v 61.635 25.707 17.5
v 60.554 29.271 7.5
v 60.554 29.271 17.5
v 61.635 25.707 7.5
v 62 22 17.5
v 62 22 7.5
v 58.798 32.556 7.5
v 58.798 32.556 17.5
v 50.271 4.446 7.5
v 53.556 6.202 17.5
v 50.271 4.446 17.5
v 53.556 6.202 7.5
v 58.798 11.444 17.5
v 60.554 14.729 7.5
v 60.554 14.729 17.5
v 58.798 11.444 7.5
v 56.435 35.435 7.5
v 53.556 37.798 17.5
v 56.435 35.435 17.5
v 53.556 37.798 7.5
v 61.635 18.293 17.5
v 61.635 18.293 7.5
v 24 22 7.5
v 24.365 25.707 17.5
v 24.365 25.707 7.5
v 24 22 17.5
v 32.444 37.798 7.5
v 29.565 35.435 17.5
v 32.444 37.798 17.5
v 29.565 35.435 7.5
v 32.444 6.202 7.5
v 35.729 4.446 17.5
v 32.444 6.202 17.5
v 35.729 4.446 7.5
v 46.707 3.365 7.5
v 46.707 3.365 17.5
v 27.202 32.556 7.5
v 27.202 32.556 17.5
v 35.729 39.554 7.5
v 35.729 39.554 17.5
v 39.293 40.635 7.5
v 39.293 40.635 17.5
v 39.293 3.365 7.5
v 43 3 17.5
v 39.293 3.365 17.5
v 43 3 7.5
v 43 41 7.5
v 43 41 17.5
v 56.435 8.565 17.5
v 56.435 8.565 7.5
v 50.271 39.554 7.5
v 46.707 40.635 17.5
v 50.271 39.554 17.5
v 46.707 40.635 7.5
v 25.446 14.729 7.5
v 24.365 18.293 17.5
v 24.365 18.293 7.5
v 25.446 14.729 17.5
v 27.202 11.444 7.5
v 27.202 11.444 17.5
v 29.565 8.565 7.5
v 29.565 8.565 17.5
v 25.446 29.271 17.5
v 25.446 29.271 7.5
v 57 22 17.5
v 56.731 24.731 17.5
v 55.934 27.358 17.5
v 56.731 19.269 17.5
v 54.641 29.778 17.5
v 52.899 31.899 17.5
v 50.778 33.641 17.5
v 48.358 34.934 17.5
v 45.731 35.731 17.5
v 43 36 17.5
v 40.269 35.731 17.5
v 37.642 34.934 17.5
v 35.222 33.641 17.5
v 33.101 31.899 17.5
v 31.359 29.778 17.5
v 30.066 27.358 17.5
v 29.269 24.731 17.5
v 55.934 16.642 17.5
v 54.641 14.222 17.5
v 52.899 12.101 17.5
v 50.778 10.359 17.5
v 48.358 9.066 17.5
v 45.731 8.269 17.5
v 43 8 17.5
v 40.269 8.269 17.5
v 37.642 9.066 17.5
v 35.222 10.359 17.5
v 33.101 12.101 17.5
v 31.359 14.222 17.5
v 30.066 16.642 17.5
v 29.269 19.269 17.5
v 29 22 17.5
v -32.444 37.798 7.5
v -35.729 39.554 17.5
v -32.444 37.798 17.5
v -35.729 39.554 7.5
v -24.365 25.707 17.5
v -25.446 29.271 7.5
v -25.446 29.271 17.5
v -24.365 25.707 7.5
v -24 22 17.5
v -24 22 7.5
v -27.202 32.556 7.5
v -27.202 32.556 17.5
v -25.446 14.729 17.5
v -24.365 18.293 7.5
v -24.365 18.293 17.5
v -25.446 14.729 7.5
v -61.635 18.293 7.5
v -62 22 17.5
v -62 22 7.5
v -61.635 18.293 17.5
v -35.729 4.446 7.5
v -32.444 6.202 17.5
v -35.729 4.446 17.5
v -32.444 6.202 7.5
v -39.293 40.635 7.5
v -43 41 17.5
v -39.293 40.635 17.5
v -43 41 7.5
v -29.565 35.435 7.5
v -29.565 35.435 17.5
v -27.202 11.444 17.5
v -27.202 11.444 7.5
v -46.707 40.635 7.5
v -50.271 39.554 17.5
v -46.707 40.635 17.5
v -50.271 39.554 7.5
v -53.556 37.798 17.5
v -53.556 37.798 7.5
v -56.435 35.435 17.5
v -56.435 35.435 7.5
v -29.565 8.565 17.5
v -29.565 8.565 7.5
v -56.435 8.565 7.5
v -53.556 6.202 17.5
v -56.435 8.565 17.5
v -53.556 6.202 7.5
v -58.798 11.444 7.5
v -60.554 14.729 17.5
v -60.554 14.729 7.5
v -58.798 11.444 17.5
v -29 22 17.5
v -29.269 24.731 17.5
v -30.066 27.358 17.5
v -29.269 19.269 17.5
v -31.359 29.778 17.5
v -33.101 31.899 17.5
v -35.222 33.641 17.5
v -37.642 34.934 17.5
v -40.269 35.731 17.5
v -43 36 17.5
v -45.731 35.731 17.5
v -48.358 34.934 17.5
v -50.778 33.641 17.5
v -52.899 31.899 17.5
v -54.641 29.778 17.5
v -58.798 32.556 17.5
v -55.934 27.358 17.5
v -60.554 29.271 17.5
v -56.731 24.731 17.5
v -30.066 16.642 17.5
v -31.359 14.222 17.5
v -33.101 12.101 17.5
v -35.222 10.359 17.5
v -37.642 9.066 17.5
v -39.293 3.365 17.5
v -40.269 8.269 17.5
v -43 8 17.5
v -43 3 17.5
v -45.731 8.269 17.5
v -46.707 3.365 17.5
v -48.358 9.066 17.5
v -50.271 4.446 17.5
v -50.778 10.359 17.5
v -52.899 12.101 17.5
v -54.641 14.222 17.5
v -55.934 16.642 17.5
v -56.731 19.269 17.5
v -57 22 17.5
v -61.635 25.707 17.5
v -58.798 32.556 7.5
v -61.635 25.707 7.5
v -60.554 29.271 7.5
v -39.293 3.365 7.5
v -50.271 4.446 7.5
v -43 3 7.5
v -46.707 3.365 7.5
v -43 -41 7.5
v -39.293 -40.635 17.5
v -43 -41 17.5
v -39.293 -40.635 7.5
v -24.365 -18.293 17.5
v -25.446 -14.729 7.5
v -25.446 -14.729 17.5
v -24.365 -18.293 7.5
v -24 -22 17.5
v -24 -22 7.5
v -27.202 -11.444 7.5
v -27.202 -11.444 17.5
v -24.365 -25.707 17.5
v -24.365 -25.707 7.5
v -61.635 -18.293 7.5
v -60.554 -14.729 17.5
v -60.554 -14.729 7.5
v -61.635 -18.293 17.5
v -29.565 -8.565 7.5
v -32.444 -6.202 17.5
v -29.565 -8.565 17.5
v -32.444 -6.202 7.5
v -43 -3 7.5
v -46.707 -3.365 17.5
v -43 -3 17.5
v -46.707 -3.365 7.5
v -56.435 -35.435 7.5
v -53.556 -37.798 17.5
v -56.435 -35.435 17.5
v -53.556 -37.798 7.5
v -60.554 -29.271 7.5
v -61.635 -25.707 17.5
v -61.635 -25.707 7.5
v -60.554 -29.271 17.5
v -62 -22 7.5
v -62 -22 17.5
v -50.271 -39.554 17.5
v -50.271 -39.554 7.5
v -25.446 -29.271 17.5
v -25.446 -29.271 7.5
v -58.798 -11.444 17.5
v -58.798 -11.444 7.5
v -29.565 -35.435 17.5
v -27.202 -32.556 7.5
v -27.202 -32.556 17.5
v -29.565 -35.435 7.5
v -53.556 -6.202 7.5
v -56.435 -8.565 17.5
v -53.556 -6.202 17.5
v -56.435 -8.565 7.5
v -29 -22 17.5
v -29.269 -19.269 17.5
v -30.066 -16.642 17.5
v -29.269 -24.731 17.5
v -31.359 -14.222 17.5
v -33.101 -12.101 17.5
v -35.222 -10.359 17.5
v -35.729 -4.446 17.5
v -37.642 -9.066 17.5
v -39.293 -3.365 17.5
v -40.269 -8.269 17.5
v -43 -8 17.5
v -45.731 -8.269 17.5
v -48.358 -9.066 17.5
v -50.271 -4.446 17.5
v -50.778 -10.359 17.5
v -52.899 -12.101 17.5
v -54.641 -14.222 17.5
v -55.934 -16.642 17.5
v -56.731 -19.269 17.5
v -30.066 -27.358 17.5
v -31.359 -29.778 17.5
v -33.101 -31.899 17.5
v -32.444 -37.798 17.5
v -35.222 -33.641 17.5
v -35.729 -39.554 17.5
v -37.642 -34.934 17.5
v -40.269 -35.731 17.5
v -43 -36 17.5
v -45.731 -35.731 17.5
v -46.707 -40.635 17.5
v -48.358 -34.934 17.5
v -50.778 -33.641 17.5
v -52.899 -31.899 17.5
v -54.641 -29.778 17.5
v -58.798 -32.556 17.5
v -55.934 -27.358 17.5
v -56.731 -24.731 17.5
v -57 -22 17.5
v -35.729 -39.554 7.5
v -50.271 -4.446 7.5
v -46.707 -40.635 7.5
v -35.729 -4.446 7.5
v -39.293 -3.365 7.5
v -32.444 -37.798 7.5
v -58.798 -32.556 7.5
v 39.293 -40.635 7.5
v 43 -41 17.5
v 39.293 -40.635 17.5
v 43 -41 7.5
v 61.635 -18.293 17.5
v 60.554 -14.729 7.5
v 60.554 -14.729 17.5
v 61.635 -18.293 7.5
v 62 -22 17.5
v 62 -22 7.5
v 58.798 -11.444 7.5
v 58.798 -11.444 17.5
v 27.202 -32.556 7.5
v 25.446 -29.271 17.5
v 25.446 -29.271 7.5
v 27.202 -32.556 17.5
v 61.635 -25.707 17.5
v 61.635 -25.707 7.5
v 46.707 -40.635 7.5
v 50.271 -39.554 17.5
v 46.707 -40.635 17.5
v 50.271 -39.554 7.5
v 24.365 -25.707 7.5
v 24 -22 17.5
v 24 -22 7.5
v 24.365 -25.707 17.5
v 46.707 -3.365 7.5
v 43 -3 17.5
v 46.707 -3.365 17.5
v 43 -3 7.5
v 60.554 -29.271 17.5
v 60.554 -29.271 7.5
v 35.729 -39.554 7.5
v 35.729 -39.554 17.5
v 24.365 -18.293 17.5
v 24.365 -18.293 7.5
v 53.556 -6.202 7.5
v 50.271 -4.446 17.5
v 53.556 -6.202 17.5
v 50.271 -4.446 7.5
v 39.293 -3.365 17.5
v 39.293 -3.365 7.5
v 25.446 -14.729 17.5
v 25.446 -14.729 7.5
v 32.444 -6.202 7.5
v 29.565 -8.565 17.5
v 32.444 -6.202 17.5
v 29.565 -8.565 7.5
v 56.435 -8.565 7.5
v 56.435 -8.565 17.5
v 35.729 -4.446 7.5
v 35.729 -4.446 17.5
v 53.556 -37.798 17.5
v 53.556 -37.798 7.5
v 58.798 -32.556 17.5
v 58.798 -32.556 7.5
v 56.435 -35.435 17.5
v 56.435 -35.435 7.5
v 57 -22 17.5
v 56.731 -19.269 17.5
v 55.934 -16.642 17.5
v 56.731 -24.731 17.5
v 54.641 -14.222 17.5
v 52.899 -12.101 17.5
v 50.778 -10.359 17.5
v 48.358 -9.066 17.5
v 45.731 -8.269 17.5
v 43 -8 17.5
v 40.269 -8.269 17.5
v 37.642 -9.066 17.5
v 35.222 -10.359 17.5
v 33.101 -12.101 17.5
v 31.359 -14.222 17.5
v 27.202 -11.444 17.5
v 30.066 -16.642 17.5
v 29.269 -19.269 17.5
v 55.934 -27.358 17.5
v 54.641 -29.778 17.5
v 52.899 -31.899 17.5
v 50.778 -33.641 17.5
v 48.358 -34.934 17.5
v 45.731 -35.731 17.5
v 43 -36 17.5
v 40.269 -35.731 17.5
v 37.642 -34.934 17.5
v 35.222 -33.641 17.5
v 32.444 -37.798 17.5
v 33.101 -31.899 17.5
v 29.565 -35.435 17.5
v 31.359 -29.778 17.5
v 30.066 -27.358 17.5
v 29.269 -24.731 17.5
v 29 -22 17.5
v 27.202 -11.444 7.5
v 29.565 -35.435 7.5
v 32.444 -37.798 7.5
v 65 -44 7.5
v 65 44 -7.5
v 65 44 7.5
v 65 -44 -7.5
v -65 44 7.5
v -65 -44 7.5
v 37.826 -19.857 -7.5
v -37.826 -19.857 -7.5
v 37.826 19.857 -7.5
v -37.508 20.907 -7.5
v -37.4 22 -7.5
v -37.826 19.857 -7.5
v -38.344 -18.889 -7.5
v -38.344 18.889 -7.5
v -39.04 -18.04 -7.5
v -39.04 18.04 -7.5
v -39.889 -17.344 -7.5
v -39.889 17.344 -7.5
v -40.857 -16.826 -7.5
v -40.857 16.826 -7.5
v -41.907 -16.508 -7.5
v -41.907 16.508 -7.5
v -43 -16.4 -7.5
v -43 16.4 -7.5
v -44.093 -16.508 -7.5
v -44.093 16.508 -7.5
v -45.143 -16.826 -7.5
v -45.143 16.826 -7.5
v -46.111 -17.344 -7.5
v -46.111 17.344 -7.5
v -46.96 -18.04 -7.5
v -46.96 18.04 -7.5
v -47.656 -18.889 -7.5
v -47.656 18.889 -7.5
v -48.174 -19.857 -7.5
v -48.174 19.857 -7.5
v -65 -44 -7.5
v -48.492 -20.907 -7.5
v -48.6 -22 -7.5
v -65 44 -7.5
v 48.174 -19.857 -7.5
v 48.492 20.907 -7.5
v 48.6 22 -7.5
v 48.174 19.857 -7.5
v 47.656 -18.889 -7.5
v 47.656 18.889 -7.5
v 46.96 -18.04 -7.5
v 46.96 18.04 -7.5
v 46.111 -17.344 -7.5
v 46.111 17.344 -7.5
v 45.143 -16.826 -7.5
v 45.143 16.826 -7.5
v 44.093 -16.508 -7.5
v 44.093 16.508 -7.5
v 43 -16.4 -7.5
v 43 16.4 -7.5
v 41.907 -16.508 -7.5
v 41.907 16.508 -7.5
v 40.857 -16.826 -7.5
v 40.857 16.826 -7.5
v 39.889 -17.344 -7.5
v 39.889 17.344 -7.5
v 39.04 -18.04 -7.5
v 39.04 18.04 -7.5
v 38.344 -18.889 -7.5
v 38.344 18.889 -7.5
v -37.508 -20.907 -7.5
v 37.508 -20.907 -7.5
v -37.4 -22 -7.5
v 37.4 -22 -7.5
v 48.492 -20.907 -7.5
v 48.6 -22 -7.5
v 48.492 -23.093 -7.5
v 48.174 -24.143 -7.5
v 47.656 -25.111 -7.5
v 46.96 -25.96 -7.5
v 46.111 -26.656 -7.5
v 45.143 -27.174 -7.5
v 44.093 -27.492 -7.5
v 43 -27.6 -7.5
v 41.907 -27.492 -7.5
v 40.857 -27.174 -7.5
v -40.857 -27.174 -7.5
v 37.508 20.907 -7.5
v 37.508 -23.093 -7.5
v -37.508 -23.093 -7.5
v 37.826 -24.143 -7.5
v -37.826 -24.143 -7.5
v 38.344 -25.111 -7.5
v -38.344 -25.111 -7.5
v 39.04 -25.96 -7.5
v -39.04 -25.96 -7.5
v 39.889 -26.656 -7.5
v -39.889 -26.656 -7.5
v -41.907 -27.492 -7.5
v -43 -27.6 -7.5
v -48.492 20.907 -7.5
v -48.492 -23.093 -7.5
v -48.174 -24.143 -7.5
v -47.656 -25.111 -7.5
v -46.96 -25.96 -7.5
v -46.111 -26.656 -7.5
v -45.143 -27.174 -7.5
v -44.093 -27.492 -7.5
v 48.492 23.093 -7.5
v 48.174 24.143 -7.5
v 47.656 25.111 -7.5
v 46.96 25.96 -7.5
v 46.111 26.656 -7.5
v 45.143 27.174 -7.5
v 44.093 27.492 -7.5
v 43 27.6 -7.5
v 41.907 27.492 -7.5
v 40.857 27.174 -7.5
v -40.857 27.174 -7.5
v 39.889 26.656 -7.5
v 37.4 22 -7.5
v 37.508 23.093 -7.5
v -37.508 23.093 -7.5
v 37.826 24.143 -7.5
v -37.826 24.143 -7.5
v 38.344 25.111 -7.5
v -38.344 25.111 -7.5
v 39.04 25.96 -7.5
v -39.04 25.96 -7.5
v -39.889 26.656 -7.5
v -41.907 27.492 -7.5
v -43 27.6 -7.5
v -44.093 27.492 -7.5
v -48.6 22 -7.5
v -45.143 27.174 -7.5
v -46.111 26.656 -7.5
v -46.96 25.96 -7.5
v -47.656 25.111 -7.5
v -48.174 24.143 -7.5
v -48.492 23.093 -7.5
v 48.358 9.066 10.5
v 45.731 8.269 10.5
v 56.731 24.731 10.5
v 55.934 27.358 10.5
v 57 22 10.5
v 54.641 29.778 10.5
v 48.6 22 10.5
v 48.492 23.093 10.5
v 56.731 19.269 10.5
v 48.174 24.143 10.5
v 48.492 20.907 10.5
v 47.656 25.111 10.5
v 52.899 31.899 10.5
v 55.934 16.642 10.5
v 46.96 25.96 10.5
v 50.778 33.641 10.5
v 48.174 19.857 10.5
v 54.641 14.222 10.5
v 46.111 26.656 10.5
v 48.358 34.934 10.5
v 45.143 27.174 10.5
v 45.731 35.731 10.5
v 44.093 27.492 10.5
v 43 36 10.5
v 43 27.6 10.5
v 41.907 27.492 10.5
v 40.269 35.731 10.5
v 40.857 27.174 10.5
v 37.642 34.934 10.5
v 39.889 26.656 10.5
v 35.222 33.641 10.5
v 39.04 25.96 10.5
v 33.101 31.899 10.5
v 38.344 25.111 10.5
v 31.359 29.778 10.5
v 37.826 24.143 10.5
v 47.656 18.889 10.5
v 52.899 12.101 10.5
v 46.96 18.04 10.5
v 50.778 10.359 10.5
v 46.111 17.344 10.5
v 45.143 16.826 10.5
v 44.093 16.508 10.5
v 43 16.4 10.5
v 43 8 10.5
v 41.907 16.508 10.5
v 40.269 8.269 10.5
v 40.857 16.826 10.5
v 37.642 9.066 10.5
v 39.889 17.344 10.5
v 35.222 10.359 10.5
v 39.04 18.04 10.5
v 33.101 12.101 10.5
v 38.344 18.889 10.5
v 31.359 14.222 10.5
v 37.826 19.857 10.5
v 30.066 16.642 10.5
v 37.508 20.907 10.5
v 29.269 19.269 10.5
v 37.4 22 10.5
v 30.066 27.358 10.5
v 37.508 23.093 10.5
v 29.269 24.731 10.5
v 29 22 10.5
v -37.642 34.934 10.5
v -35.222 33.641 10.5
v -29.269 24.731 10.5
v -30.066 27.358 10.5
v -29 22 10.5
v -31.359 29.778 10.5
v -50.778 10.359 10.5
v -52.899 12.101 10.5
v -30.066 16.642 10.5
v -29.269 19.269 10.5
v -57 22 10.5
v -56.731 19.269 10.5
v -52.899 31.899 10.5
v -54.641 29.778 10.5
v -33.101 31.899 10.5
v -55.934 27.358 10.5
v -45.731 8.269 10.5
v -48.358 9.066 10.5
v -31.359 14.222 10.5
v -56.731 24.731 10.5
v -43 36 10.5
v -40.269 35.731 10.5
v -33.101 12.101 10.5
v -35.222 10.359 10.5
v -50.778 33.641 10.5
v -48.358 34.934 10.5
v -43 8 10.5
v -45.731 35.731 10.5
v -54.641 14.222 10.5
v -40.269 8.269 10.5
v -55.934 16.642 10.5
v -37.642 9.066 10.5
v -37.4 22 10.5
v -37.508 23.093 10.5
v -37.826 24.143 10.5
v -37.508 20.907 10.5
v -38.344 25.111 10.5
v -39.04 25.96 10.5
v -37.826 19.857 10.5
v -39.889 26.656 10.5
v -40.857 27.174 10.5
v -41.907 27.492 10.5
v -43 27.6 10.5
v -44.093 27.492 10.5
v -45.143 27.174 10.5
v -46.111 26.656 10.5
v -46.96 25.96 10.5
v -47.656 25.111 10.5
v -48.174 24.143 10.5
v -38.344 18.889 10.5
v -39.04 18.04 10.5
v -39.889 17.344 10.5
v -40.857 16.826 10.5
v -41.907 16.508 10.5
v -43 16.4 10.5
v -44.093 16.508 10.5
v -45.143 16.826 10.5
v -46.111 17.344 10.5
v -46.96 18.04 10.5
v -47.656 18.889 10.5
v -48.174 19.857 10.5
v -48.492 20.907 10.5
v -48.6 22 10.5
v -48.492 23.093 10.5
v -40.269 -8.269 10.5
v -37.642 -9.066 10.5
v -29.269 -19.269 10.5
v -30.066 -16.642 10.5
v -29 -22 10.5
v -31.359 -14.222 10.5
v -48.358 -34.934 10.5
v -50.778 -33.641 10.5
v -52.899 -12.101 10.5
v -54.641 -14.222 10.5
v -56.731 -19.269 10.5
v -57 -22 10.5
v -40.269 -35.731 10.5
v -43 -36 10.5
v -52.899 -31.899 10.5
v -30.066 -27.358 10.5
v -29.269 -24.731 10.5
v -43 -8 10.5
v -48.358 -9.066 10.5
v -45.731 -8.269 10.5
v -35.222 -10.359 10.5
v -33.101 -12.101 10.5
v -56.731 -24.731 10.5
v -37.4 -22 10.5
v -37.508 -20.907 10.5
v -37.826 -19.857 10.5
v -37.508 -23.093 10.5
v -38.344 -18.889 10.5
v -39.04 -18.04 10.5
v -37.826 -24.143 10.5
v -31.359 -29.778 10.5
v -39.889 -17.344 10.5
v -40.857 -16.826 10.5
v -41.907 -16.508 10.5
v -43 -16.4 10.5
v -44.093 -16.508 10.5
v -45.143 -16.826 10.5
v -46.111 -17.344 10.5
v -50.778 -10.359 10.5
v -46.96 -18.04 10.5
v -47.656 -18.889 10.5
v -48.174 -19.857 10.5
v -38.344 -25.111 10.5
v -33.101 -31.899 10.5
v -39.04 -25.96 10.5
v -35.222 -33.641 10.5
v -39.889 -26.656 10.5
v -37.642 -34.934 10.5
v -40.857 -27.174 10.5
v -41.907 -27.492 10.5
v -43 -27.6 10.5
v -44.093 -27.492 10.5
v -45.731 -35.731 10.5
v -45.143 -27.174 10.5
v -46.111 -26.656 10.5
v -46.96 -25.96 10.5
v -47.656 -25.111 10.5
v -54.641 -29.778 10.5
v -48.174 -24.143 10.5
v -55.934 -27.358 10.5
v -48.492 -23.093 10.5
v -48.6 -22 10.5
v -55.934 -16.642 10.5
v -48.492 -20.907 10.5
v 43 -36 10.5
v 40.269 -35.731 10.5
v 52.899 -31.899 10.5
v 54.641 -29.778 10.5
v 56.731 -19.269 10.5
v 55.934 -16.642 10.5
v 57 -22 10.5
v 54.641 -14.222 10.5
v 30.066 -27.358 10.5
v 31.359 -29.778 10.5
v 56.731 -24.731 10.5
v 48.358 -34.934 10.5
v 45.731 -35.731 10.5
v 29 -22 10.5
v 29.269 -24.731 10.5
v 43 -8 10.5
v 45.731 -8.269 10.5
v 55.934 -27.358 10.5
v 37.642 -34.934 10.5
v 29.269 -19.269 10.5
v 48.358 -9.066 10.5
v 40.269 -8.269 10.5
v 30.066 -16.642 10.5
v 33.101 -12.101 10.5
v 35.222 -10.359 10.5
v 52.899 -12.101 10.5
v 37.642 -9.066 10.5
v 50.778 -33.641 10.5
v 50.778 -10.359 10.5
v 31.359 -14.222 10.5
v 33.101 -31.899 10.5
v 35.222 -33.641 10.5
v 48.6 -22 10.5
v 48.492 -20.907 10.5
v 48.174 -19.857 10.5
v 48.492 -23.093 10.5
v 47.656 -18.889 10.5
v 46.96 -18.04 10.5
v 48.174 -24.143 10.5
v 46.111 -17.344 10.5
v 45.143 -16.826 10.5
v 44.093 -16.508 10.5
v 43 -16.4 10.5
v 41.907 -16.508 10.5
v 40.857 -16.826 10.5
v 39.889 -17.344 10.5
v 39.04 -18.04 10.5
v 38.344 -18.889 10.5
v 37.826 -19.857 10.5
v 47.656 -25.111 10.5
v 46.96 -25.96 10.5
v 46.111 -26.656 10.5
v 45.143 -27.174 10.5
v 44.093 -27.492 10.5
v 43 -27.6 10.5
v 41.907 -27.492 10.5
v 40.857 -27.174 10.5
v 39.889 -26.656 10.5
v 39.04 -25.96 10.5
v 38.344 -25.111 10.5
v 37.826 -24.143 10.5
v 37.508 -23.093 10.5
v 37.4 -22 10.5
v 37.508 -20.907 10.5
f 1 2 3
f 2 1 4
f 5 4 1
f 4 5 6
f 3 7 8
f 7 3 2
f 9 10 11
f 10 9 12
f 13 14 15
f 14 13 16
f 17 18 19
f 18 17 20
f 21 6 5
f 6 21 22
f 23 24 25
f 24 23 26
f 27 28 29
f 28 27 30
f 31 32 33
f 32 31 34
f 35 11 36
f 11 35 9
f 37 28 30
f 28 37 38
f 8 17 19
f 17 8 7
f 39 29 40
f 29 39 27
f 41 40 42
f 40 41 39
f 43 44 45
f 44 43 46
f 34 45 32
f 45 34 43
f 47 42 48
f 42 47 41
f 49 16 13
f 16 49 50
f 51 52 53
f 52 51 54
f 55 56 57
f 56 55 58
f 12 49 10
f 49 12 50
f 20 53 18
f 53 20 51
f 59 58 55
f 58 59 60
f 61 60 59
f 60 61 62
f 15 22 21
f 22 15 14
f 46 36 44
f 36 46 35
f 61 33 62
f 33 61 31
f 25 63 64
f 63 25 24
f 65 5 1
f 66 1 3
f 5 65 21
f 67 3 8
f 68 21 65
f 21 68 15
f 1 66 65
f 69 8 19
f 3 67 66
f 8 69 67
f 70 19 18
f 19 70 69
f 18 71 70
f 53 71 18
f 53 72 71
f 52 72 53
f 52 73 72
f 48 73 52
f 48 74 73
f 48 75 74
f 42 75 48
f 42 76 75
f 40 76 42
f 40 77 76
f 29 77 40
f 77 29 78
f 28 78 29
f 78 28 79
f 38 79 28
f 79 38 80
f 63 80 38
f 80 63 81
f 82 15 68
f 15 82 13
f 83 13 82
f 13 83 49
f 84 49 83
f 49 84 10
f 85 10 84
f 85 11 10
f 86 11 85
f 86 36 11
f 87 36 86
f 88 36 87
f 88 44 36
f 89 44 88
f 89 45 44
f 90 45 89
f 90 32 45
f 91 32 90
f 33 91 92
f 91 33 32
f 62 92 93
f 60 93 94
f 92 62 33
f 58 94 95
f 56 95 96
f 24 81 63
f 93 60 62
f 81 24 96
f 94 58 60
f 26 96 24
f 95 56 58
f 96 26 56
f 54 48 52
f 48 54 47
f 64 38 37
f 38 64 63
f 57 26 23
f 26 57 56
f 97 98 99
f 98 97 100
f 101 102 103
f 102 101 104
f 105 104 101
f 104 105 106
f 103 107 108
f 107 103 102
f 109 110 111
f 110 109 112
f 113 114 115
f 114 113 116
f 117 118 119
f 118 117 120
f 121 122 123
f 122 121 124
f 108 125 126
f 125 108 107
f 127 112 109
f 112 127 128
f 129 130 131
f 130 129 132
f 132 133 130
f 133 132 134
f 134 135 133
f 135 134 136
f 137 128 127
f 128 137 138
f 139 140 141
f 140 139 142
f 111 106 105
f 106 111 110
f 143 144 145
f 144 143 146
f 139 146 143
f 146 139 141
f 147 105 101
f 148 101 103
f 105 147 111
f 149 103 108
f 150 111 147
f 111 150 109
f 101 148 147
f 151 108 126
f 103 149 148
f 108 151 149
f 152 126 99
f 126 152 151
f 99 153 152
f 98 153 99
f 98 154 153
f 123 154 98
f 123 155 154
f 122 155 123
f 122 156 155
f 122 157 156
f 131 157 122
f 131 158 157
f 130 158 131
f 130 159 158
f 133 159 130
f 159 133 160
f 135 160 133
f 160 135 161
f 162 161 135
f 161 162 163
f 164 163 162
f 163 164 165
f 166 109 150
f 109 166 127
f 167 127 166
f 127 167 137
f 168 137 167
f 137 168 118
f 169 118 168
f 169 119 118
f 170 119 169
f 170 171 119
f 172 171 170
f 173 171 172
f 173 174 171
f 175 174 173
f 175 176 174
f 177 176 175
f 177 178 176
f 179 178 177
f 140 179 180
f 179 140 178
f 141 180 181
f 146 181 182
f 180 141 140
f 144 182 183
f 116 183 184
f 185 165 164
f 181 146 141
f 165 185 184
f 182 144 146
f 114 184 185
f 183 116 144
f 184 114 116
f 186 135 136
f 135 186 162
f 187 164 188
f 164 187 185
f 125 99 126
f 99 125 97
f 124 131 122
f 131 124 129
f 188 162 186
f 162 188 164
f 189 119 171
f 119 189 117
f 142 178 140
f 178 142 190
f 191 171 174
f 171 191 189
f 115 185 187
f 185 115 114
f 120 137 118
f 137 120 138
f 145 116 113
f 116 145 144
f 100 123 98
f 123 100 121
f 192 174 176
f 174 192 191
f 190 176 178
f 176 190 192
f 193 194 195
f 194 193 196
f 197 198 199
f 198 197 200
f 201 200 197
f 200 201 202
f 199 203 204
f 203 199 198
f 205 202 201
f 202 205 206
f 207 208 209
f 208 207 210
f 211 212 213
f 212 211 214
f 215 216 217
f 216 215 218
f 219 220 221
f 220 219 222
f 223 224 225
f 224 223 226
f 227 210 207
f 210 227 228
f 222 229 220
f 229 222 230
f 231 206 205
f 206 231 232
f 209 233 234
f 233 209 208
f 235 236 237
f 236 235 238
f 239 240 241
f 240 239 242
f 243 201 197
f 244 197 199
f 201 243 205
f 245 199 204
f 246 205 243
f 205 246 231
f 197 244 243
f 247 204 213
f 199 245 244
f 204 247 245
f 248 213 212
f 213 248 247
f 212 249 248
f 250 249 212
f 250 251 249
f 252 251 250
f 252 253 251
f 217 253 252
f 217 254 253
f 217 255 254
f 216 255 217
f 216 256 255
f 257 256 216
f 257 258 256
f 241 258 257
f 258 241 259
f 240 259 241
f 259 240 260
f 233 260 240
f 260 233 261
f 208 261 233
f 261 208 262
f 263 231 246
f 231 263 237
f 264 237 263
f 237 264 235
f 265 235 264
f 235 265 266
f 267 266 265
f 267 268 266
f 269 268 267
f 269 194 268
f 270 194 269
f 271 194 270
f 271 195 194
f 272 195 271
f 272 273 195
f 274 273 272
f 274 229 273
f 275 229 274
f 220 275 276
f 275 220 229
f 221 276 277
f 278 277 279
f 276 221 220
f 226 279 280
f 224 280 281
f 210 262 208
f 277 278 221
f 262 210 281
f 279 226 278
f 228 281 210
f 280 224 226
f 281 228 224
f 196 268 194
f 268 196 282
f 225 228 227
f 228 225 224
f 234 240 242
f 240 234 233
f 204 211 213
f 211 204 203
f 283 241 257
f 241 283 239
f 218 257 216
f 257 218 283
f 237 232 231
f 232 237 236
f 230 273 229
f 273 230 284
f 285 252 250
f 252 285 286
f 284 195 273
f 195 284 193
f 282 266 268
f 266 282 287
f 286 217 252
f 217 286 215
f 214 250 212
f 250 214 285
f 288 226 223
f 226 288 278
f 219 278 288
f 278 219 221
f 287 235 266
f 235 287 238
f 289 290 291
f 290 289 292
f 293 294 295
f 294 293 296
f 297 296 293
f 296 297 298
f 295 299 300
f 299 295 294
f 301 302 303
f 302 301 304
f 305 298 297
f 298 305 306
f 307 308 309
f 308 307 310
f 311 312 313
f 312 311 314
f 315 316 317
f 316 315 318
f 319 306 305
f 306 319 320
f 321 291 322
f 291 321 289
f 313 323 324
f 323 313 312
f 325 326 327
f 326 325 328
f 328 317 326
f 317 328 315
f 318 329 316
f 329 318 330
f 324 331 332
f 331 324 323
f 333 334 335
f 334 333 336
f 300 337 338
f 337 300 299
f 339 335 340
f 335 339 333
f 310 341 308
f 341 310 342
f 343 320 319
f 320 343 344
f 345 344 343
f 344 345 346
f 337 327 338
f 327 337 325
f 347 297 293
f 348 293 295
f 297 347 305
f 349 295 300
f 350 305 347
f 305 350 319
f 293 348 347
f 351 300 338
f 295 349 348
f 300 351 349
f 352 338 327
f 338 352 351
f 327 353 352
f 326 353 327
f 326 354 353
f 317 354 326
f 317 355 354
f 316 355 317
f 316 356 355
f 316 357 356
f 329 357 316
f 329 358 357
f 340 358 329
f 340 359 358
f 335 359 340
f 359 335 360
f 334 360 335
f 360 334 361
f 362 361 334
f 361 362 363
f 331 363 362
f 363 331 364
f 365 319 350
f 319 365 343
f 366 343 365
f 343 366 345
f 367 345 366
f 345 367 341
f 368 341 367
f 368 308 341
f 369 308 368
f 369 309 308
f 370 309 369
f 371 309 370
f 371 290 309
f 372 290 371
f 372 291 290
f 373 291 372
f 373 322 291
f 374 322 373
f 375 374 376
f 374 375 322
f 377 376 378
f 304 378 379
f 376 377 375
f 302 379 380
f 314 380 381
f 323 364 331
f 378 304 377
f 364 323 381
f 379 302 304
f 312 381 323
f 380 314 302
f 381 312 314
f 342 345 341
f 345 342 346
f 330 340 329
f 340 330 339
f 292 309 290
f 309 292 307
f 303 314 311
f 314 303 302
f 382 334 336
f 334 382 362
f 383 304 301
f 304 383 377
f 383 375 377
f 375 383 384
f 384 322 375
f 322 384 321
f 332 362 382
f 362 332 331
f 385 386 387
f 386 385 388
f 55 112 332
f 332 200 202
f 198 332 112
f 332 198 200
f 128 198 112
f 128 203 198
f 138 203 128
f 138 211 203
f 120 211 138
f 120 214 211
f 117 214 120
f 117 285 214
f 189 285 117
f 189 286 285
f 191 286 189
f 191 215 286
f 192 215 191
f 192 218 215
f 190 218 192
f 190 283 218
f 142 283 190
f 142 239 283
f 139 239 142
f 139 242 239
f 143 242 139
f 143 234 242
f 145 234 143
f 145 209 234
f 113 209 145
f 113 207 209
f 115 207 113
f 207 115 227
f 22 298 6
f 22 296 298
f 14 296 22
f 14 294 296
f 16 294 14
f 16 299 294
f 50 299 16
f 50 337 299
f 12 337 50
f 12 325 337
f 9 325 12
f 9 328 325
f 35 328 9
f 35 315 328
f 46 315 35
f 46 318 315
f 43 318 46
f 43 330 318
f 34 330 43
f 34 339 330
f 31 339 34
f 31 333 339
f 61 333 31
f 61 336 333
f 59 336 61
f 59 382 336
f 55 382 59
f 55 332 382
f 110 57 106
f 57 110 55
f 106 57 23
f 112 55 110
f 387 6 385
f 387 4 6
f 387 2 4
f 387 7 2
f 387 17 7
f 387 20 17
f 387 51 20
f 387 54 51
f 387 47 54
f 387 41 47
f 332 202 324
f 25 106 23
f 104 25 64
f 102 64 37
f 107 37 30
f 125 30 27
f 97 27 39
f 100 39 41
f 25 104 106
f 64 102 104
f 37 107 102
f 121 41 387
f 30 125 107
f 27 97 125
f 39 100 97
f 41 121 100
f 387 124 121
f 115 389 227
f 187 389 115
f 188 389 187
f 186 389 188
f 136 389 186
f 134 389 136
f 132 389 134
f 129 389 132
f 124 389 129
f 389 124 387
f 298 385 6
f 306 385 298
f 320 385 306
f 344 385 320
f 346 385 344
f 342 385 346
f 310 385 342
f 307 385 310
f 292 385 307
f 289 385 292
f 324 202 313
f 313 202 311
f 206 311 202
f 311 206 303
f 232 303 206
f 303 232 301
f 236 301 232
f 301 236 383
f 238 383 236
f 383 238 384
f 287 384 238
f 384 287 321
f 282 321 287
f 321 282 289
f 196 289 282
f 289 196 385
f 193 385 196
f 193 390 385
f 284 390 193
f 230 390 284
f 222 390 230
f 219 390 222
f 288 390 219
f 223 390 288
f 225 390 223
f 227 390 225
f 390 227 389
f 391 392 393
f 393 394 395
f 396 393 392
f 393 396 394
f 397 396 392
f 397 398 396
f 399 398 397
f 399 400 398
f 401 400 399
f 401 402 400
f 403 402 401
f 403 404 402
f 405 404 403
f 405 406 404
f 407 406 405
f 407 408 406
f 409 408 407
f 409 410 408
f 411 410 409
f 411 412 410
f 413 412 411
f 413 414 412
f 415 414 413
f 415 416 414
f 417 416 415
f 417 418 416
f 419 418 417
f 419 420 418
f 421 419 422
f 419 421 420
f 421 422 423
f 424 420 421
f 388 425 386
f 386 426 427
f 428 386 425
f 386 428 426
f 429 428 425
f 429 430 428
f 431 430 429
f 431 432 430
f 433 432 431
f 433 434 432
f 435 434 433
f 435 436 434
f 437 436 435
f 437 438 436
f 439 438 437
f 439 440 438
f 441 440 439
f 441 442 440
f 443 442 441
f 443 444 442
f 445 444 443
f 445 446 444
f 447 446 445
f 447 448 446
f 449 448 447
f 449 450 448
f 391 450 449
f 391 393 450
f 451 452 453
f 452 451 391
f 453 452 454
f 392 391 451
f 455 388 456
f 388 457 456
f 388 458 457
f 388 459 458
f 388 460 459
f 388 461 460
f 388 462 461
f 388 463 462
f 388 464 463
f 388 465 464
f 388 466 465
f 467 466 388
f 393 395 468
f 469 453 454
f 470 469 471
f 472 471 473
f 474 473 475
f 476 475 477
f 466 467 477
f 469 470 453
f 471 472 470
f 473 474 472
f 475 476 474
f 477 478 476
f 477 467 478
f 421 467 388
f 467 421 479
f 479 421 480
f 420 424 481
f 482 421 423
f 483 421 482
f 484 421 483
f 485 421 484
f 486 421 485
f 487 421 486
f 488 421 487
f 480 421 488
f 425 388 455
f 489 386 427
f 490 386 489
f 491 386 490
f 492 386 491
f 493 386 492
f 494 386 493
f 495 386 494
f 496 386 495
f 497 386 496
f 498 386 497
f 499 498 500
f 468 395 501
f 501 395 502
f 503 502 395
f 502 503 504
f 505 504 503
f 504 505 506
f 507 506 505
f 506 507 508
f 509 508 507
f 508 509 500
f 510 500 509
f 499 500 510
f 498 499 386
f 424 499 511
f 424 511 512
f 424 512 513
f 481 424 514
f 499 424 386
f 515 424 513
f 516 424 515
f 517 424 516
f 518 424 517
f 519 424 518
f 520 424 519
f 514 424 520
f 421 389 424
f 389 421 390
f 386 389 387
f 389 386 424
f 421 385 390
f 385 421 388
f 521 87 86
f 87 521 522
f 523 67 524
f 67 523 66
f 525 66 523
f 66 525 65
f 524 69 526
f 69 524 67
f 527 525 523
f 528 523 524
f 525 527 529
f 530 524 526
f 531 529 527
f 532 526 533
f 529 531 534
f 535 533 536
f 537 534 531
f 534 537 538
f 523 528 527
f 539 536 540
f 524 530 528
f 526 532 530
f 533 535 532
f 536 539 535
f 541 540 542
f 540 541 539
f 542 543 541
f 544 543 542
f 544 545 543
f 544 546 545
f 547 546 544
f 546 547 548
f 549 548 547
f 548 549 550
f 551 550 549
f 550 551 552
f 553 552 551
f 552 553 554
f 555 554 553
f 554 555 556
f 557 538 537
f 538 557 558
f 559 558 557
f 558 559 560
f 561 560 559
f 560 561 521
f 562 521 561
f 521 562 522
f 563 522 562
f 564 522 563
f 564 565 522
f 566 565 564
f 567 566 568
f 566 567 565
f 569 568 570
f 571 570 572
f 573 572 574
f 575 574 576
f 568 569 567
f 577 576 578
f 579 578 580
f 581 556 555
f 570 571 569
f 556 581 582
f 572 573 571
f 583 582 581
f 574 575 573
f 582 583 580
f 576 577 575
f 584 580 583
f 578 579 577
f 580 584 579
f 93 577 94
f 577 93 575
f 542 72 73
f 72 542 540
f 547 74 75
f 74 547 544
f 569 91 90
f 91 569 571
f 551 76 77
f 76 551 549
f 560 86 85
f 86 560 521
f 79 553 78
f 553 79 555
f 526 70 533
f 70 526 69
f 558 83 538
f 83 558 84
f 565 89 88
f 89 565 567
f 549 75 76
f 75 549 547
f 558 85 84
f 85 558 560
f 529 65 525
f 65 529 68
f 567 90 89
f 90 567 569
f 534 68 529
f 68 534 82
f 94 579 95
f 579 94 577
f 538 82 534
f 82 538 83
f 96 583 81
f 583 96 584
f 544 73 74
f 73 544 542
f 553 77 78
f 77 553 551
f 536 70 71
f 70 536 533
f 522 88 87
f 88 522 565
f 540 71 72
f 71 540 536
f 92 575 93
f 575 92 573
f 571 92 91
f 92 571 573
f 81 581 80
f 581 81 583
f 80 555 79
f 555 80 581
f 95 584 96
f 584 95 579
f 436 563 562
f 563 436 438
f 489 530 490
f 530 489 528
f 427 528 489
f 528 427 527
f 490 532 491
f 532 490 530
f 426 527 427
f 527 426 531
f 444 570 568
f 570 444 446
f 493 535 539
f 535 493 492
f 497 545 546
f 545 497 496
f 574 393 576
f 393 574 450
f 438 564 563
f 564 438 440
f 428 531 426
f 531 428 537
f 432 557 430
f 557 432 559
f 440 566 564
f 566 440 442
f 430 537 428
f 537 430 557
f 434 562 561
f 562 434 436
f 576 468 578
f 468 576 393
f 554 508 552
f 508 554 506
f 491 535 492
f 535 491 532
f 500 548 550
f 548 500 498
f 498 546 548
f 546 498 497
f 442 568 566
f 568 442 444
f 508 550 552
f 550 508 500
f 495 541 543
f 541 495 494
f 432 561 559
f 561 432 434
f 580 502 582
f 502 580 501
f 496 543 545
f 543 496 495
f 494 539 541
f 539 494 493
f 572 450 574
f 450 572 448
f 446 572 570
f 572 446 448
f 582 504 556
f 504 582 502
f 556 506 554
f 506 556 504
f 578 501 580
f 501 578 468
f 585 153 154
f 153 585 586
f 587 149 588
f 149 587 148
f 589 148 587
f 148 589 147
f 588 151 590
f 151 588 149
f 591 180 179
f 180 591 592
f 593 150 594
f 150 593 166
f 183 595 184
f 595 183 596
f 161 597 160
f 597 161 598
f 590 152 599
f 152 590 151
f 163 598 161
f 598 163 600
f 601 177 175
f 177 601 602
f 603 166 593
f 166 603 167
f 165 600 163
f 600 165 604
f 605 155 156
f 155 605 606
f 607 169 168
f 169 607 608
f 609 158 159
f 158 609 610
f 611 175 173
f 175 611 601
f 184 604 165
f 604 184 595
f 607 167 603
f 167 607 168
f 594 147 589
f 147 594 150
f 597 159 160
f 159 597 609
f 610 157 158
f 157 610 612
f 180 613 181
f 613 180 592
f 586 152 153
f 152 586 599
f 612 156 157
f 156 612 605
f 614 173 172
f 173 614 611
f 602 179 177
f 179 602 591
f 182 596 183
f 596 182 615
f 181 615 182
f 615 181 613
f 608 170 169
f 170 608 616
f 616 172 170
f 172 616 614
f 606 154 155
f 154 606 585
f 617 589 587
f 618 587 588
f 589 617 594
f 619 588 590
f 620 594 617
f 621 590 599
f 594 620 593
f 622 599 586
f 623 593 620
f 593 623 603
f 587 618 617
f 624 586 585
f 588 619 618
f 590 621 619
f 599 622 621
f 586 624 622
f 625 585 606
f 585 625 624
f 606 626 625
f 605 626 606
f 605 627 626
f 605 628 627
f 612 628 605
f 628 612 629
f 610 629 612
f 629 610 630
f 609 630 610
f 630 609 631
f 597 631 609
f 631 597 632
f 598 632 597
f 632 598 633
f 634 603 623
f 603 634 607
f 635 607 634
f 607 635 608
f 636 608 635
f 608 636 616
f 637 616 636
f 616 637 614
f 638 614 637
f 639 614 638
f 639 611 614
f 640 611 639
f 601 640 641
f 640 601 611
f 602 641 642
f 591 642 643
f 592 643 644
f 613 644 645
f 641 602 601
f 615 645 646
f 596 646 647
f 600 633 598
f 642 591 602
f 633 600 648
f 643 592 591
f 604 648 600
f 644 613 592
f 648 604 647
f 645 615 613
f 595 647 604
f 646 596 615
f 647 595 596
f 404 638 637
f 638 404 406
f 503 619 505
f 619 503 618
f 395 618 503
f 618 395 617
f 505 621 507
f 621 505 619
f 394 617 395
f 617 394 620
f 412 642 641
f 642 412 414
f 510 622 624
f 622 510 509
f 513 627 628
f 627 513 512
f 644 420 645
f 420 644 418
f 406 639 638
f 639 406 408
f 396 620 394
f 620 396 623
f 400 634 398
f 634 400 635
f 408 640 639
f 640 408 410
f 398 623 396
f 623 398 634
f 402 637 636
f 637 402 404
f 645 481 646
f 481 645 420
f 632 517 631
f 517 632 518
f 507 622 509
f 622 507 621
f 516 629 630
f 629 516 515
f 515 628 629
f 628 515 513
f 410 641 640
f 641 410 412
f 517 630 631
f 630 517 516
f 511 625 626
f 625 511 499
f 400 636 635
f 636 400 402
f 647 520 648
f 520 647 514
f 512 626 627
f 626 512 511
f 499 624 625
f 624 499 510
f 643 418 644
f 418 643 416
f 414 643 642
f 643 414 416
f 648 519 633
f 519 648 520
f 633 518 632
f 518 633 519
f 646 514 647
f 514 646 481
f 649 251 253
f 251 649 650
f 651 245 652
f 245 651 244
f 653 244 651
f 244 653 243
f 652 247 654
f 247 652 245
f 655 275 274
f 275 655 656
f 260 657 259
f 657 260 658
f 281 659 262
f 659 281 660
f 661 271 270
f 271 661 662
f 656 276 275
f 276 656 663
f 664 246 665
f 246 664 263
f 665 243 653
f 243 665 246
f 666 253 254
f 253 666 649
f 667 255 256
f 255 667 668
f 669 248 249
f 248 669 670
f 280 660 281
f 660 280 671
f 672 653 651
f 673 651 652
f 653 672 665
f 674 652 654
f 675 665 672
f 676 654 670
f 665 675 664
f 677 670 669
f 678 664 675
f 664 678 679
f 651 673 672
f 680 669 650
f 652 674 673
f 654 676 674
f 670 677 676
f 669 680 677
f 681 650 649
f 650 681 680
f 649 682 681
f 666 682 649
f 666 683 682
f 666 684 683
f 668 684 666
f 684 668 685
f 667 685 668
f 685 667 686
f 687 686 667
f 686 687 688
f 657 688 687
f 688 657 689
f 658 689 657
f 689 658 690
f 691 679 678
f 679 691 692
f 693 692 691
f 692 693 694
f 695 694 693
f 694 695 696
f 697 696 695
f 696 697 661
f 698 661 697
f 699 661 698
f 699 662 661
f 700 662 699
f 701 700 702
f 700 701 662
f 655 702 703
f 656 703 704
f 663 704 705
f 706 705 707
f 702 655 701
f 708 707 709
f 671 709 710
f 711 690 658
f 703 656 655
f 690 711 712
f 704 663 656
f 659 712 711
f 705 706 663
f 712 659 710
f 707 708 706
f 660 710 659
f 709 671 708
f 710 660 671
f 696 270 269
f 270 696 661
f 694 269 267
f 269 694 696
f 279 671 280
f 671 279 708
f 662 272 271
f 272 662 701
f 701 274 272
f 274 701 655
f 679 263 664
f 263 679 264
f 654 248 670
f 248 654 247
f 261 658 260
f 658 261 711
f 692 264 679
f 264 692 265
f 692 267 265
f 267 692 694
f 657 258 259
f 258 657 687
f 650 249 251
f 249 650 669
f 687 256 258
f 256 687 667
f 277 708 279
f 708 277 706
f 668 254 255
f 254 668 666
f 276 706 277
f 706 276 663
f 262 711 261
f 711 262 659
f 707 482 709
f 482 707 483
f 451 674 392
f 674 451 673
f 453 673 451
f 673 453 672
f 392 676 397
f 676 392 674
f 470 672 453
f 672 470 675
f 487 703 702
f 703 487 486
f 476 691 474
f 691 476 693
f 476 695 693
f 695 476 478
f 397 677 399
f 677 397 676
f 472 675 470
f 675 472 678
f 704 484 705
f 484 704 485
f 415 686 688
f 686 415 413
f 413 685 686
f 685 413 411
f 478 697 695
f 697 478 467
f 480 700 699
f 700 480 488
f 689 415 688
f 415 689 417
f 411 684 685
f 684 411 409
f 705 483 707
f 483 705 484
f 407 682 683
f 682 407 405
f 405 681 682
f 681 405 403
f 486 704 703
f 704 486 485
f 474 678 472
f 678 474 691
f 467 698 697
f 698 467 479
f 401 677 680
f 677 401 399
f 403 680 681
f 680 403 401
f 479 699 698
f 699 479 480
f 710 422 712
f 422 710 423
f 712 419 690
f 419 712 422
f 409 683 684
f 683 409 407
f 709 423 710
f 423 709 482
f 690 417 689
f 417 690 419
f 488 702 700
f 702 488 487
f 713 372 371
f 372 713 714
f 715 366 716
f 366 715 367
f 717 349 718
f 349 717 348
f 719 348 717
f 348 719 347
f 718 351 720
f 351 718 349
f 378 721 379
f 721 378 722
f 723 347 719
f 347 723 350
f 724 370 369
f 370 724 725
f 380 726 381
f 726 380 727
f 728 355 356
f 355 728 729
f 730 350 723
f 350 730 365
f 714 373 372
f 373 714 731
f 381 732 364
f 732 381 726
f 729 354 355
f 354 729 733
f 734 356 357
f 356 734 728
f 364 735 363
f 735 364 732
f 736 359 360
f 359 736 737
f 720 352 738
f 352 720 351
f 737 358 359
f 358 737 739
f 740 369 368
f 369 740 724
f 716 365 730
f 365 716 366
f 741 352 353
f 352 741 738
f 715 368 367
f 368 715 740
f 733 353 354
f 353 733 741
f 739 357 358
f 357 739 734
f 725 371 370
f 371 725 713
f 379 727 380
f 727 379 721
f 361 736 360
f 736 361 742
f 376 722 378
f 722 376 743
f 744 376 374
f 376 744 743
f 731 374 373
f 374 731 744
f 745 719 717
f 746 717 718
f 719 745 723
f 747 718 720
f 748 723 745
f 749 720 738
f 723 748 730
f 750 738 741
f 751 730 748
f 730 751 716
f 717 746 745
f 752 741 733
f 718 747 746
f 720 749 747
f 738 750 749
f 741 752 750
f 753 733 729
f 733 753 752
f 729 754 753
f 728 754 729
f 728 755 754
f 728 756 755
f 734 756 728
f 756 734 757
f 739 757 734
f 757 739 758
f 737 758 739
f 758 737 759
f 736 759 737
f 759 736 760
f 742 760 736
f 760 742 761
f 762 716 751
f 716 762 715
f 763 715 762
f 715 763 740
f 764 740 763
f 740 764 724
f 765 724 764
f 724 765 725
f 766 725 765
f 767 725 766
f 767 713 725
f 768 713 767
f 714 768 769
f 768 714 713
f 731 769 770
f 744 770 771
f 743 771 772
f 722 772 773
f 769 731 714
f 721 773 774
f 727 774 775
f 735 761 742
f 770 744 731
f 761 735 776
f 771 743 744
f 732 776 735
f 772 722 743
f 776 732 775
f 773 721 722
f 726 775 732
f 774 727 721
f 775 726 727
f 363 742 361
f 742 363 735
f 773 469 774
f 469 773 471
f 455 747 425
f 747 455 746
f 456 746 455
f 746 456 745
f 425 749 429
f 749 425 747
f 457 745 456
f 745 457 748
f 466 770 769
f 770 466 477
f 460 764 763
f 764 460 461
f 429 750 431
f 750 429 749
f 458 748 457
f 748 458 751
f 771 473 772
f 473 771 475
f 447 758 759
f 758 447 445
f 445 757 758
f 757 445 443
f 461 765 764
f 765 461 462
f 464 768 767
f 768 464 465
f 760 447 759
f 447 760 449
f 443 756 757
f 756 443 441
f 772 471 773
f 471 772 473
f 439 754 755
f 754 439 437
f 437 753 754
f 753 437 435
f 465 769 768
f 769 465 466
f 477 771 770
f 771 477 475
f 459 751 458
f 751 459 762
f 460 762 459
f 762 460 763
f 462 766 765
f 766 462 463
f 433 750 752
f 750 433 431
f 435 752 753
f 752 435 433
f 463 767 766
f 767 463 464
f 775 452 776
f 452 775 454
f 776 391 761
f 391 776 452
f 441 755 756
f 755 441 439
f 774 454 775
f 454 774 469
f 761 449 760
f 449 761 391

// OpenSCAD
$fn = 32;

// ----------------------------------------------------------------------
// Socket pad plate
// bosses with counterbored sockets for the screws
// ----------------------------------------------------------------------

// --- parameters (mm) ---
base_t = 15;            // base plate thickness
boss_h = 10;            // boss height above the base plate
boss_d = 38;            // boss diameter
socket_d = 28;          // socket diameter
socket_depth = 7;       // socket depth from the boss face
bolt_d = 11.2;          // screw clearance hole through the socket floor
plate = [130, 88, 15];  // overall size (x, y, z)
edge = 22;              // boss centre offset from the plate edge
pads = 4;               // boss count, one per corner

// --- derived feature positions (mm) ---
height = base_t + boss_h;        // = 25   overall height of the part
corner_x = plate[0] / 2 - edge;  // = 43   boss centre X
corner_y = plate[1] / 2 - edge;  // = 22   boss centre Y
feature_centers = [
  [corner_x, corner_y],
  [-corner_x, corner_y],
  [-corner_x, -corner_y],
  [corner_x, -corner_y]
];   // boss centres: sockets, holes and the pads themselves are placed from here

// base plate, bosses on feature_centers, socket + through hole in each
difference() {
  union() {
    cube(plate, center = true);
    for (centre = feature_centers)
      translate([centre[0], centre[1], plate[2] / 2 - 1])
        cylinder(d = boss_d, h = boss_h + 1);
  }
  for (centre = feature_centers) {
    translate([centre[0], centre[1], plate[2] / 2 + boss_h - socket_depth])
      cylinder(d = socket_d, h = socket_depth + 1);
    translate([centre[0], centre[1], -height])
      cylinder(d = bolt_d, h = 2 * height + 2);  // through the socket floor
  }
}
